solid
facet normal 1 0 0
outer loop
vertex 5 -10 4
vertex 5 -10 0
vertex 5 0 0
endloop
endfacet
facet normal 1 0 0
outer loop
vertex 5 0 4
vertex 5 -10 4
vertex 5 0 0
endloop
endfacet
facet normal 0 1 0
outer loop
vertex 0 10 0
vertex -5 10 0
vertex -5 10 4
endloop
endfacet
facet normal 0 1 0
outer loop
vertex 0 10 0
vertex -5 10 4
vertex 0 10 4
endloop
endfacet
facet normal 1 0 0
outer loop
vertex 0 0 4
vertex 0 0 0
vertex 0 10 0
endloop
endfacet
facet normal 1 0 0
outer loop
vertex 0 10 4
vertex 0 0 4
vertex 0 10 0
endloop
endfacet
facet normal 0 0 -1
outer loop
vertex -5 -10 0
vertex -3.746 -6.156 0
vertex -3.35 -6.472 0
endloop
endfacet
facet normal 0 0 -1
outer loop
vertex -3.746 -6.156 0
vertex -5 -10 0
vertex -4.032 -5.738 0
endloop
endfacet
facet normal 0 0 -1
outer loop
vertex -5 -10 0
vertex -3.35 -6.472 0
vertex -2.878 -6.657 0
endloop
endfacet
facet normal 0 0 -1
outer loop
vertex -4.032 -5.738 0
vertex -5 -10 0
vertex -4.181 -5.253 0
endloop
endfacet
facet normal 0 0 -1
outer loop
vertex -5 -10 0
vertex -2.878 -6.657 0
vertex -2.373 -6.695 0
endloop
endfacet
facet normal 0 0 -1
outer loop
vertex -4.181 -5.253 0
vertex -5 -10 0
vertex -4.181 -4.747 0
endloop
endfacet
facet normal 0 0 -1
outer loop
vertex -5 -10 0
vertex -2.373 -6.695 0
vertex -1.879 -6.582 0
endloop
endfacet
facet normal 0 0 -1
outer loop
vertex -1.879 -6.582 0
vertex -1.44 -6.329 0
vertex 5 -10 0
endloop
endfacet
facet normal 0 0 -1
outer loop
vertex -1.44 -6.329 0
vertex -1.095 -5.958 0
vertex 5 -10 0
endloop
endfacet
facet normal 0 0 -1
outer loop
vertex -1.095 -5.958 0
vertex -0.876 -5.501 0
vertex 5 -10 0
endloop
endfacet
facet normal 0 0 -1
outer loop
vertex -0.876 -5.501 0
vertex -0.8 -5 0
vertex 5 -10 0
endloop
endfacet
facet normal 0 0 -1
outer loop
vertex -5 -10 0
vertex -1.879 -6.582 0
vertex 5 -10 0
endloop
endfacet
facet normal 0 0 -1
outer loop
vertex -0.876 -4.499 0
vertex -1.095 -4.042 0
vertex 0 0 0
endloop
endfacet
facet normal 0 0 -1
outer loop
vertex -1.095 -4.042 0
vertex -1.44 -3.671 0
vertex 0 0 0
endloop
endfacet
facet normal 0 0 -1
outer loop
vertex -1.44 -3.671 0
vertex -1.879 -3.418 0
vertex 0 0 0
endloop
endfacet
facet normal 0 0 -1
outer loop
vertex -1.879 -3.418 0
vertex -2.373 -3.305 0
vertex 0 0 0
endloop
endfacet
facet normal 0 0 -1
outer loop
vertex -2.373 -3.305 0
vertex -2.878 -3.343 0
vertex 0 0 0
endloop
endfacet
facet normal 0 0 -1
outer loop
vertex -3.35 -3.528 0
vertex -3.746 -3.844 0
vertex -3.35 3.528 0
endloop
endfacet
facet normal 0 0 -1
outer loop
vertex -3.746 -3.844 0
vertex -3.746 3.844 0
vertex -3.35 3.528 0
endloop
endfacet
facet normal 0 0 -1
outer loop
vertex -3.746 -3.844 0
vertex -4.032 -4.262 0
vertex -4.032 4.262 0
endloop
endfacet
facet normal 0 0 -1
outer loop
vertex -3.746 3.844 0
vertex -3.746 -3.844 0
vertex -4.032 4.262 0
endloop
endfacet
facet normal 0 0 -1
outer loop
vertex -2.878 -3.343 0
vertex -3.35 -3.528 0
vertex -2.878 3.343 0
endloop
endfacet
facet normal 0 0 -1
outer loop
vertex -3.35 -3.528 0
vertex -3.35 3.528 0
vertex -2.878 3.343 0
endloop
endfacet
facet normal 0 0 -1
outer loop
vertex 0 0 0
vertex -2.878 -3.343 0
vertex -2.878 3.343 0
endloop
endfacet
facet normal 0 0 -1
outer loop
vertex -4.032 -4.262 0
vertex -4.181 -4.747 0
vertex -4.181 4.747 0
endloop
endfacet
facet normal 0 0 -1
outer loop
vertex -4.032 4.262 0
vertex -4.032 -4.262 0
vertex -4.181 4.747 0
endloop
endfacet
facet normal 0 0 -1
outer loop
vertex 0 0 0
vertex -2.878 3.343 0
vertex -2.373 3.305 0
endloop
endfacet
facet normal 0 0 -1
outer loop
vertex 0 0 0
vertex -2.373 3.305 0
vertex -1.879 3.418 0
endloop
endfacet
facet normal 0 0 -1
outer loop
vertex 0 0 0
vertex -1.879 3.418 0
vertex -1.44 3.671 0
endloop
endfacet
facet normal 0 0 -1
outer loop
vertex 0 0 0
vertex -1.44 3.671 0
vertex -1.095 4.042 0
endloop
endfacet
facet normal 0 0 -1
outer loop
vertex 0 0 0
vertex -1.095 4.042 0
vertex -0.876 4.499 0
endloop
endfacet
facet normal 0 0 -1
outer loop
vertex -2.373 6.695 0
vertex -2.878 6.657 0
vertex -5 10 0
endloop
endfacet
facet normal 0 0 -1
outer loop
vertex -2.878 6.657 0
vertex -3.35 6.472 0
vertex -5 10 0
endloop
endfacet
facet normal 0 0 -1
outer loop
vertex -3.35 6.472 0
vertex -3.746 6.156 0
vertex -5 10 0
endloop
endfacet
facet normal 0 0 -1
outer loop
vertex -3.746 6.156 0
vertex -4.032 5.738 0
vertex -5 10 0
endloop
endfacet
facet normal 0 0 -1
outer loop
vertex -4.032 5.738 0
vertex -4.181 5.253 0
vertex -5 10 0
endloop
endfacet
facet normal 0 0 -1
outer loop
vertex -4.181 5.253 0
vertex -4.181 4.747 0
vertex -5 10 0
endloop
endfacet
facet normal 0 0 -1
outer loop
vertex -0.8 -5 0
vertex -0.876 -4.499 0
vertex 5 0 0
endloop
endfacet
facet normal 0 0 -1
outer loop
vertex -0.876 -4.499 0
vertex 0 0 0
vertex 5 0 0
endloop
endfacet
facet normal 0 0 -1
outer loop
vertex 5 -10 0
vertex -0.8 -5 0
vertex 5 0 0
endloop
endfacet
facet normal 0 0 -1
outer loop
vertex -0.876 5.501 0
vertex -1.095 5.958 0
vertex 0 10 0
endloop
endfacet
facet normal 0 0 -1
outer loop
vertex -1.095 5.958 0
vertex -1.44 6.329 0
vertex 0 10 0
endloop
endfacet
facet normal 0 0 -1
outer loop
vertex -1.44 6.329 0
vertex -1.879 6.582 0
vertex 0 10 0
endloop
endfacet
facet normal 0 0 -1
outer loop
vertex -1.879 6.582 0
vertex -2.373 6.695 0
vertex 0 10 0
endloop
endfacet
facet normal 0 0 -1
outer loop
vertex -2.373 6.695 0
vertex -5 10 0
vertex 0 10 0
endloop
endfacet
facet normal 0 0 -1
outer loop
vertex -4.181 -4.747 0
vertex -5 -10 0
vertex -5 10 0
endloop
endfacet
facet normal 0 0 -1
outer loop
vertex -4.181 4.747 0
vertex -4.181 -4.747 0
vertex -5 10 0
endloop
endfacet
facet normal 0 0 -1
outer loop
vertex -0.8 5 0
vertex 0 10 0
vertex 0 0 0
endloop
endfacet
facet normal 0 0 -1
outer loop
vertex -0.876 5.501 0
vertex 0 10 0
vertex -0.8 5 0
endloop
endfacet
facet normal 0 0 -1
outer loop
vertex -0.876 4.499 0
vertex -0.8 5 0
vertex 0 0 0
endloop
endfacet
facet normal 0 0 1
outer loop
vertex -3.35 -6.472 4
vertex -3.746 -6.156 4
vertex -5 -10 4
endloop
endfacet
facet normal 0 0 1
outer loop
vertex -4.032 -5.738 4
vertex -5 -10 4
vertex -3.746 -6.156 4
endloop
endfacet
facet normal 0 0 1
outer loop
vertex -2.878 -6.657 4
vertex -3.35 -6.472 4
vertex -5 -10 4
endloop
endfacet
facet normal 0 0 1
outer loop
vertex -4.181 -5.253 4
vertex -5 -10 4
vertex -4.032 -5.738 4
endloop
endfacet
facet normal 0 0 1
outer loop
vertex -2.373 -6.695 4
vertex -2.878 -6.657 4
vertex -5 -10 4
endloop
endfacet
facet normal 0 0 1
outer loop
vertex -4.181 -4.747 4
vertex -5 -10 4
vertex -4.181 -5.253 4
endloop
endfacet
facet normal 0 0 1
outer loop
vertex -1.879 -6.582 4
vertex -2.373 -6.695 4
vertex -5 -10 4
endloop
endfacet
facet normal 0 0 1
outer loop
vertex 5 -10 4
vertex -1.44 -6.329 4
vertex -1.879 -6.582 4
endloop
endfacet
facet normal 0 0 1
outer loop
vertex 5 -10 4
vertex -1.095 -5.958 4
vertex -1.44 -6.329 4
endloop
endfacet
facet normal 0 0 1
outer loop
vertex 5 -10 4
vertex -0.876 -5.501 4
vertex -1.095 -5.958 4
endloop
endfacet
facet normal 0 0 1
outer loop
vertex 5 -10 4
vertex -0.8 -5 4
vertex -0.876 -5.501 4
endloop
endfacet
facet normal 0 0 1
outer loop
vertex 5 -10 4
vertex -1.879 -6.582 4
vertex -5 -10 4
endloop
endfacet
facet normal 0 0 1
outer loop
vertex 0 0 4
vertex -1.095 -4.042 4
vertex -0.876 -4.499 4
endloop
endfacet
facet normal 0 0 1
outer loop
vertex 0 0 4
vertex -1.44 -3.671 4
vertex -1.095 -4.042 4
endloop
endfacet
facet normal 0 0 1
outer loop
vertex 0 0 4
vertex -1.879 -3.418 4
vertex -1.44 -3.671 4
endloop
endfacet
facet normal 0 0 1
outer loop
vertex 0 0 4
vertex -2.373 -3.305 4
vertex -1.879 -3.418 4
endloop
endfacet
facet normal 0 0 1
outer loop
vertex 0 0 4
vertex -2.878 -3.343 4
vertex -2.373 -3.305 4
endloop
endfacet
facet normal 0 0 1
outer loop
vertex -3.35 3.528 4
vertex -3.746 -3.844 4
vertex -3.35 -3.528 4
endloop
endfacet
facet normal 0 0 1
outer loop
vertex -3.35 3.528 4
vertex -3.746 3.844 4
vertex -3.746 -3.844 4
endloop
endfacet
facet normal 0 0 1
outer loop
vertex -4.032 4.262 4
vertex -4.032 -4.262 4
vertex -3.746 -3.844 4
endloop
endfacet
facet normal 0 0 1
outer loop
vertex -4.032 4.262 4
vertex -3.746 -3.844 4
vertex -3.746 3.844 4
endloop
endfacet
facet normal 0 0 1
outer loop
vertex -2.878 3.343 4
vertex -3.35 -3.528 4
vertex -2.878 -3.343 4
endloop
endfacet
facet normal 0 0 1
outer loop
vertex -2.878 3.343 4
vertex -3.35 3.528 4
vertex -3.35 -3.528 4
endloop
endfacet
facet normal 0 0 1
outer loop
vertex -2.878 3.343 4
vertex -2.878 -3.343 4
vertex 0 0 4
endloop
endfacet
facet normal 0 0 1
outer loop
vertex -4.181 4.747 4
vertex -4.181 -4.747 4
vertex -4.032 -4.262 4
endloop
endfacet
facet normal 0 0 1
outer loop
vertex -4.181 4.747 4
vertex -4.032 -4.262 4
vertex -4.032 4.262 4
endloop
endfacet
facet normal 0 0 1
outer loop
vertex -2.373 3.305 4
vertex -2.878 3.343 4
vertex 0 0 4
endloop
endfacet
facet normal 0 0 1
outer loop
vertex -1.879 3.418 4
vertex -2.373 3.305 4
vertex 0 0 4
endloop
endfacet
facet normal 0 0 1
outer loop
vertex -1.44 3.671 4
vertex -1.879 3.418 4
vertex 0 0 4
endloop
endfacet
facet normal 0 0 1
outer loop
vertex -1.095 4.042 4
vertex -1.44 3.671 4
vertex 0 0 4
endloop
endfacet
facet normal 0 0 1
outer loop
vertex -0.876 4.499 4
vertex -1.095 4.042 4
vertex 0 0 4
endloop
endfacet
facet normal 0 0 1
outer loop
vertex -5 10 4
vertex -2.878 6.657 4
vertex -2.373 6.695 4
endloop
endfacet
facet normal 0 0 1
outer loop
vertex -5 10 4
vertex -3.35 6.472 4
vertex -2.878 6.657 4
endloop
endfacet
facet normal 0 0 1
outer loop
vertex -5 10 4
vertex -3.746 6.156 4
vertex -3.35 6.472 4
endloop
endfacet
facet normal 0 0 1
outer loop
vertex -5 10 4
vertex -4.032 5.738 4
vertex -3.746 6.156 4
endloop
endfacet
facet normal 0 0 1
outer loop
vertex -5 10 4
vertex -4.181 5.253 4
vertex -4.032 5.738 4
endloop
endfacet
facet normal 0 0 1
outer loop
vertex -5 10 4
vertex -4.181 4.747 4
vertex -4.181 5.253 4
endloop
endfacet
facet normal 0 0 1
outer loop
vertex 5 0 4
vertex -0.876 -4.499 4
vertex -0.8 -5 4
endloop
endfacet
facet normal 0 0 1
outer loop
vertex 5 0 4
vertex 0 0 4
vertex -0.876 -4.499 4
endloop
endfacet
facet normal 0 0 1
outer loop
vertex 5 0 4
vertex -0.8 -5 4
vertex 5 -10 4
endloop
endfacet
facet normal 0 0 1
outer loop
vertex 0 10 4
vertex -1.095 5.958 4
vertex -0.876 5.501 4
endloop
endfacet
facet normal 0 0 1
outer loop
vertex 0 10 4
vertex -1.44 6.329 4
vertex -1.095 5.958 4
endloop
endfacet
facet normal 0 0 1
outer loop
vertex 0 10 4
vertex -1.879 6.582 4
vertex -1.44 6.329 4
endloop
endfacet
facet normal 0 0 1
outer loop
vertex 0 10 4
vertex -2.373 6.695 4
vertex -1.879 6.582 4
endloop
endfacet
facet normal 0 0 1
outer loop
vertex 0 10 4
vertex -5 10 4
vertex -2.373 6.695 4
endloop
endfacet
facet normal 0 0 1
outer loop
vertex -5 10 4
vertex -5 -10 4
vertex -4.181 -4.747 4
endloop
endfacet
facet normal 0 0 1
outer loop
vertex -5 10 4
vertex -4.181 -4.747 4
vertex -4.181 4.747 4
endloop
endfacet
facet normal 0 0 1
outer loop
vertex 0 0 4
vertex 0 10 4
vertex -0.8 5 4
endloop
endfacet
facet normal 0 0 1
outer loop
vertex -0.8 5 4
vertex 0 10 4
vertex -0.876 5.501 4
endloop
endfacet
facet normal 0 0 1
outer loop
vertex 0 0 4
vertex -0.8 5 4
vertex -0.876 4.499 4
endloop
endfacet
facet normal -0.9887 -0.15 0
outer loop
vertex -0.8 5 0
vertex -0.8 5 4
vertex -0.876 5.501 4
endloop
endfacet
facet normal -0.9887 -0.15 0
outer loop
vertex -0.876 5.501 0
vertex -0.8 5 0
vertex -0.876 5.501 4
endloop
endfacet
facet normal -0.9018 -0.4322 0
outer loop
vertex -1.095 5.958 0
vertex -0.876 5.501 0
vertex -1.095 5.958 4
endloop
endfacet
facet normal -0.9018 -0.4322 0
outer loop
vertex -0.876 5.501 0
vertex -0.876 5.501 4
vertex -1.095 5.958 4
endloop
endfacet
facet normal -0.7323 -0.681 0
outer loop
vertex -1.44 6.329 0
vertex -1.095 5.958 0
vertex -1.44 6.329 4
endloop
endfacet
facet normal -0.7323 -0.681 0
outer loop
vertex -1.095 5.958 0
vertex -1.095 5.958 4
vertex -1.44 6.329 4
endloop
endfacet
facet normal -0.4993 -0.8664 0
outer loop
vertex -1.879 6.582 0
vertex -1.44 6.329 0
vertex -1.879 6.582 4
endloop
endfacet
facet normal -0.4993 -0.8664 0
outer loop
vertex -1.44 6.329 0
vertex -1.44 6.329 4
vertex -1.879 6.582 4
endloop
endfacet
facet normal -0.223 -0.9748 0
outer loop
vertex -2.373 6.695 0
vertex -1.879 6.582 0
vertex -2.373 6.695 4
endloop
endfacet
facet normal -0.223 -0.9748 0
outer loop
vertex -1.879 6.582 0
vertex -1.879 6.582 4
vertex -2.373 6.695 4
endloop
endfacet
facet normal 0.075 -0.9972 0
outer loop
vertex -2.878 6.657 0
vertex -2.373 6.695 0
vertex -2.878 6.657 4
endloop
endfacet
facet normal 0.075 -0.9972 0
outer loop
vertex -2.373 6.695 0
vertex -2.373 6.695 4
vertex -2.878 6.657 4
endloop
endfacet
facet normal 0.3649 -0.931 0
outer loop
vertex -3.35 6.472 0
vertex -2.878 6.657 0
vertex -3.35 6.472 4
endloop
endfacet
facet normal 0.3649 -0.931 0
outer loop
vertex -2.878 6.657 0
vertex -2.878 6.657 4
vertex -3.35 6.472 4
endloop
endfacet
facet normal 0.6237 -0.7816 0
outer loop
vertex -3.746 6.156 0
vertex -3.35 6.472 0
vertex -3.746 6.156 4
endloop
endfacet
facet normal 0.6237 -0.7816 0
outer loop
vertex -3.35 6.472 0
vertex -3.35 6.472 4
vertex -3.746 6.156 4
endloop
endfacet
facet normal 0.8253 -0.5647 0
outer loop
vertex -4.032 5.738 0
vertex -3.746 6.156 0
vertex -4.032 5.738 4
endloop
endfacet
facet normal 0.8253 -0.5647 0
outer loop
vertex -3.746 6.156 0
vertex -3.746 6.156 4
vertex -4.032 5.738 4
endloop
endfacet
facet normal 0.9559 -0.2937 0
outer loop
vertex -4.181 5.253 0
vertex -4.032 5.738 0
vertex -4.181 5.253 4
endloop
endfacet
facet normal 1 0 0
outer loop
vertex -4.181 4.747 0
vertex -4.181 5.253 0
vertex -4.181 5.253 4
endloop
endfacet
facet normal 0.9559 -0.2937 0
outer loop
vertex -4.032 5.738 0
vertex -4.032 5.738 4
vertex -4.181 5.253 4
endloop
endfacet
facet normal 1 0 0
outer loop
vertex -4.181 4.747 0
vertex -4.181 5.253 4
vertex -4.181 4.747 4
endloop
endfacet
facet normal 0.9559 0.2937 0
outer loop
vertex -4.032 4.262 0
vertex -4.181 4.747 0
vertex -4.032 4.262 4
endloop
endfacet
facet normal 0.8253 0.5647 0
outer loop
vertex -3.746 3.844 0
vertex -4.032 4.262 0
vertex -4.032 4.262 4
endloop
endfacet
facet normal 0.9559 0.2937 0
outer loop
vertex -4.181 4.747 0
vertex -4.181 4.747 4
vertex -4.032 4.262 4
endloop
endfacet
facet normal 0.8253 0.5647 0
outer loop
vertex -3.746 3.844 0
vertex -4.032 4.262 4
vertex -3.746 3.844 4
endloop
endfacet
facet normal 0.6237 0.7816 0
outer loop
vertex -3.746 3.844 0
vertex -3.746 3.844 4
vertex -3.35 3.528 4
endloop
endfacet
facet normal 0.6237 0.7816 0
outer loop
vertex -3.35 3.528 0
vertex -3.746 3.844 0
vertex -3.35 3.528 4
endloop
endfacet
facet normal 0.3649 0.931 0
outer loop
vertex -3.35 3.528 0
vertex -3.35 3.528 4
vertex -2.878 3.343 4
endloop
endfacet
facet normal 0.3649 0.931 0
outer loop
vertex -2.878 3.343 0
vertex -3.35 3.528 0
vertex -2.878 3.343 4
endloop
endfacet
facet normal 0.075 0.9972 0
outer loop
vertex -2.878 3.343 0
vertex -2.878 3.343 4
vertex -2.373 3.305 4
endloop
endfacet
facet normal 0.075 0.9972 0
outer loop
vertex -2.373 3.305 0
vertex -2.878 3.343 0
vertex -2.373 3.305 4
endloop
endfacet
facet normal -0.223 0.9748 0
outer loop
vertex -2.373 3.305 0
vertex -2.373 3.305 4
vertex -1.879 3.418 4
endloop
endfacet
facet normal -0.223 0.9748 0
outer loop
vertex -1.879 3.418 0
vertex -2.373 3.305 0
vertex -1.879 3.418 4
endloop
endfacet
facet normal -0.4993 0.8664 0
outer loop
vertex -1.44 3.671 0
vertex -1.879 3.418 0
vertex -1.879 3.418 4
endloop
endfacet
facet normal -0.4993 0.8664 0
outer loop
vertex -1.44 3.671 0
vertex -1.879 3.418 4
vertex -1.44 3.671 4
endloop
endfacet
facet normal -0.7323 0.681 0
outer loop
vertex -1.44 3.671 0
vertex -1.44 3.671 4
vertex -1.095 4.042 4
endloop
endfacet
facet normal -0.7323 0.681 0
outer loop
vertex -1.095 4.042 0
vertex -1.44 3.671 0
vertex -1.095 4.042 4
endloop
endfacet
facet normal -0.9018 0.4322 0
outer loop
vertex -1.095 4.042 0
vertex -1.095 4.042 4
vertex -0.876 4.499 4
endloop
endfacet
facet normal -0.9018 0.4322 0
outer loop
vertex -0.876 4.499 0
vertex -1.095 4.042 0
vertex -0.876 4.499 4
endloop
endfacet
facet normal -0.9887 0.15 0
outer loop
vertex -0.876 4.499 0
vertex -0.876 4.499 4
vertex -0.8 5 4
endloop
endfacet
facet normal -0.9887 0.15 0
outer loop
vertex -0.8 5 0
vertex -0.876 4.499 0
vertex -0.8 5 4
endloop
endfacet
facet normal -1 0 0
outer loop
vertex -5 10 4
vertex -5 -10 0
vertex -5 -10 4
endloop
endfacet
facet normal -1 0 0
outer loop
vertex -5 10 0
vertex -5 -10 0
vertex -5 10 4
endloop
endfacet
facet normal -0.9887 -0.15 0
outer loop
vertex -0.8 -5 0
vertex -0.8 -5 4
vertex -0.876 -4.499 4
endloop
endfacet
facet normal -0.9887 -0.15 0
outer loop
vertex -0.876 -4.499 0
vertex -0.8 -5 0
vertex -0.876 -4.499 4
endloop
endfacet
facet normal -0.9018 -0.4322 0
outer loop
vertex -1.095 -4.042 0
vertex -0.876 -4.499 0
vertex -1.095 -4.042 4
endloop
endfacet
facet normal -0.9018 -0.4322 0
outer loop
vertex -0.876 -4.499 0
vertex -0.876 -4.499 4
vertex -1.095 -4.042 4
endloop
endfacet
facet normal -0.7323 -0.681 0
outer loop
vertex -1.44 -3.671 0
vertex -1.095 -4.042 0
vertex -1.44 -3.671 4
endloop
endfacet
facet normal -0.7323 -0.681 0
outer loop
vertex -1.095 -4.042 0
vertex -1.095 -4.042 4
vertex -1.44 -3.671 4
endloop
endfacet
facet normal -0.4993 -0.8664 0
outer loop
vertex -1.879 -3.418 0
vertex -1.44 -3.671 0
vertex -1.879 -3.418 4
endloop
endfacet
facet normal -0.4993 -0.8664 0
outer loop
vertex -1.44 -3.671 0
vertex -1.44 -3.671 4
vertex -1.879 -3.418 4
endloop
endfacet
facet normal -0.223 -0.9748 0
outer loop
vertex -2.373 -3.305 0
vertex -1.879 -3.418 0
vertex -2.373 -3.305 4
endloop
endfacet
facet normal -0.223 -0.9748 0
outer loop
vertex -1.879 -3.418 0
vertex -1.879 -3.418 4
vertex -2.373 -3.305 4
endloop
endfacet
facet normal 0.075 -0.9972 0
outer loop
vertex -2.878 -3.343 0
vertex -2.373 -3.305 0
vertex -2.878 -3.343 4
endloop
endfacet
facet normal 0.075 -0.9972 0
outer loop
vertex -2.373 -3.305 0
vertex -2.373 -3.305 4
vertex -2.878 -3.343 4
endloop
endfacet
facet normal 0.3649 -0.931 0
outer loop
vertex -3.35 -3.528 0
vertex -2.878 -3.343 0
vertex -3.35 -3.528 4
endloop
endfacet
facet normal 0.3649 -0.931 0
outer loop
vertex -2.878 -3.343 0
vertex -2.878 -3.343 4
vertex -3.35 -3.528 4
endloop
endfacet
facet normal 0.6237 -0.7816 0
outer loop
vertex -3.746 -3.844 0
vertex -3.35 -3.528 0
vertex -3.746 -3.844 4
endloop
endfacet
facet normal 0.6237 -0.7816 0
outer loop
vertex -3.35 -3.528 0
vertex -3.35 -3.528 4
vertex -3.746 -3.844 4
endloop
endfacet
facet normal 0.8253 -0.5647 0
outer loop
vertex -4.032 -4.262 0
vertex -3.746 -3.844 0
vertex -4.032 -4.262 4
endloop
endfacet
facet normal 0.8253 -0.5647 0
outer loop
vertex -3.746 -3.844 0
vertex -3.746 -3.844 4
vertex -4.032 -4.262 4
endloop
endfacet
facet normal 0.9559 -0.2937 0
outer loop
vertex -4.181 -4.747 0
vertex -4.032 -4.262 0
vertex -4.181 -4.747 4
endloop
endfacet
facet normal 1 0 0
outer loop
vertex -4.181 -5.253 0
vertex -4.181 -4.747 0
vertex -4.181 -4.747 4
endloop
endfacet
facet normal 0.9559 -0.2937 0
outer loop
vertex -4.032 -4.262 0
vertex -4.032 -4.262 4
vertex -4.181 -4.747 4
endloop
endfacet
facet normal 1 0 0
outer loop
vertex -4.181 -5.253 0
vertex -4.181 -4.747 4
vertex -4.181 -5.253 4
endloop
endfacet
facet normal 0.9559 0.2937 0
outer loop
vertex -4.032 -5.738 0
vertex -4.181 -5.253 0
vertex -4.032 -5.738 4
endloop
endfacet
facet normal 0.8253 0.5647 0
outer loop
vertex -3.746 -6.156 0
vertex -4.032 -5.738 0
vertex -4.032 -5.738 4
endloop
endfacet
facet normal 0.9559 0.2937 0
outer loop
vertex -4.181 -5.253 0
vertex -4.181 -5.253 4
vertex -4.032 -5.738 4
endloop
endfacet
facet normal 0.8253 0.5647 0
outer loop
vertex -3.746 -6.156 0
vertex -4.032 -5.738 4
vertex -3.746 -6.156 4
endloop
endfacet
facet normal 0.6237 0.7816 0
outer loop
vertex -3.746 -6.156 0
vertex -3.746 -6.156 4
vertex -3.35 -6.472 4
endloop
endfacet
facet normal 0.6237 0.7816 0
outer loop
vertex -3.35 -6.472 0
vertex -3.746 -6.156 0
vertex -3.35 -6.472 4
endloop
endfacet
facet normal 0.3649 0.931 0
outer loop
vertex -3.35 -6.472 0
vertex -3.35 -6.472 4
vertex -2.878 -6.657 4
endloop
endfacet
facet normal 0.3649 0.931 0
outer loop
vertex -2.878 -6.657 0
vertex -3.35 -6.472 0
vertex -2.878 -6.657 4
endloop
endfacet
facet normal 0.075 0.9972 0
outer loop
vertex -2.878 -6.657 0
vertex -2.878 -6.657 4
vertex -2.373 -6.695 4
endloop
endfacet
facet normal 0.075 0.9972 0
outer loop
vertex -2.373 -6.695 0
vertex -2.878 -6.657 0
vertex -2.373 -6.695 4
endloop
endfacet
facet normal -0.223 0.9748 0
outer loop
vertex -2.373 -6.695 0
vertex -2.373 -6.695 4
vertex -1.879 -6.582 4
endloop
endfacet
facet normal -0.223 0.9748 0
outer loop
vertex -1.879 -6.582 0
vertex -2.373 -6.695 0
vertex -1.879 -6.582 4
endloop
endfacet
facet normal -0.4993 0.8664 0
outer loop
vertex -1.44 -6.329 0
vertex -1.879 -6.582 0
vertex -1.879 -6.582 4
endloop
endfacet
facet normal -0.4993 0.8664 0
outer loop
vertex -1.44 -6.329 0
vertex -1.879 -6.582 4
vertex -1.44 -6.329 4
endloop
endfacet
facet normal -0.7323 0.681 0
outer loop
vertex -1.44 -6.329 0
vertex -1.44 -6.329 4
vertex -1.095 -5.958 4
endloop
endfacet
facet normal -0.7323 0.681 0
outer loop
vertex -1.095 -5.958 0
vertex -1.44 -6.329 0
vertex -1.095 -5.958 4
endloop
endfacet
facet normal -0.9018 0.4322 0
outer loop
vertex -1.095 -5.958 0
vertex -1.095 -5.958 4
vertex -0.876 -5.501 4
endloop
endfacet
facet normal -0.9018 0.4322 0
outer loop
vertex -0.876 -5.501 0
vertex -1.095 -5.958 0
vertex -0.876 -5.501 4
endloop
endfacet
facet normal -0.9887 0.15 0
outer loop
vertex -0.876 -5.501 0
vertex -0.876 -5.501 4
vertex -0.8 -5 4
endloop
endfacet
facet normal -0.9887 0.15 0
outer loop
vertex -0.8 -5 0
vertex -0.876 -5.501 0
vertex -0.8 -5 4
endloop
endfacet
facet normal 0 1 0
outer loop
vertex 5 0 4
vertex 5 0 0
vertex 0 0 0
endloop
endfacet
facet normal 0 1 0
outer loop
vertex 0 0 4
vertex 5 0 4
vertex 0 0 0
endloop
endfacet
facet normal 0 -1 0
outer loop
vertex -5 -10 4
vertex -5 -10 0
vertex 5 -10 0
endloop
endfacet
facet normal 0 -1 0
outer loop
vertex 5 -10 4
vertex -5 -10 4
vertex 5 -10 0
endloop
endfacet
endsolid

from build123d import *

# Parameters (mm, degrees)
ESQUISSE1_W             = 10
ESQUISSE1_H             = 20
BOSS_EXTRU_1_DEPTH      = 4
D_GAGEMENT_M33_D        = 3.4
ESQUISSE2_W             = 5
ESQUISSE2_H             = 10
ENL_V_MAT_EXTRU_2_DEPTH = 4


with BuildPart() as part:
    # Esquisse1 → Boss.-Extru.1 (new body)
    with BuildSketch(Plane.XY):
        Rectangle(ESQUISSE1_W, ESQUISSE1_H)
    extrude(amount=BOSS_EXTRU_1_DEPTH)

    # Dégagement M33 (through all)
    with Locations(Plane(origin=(0, 0, 0), x_dir=(-1, 0, 0), z_dir=(0, 0, -1))):
        with Locations((2.5, 5), (2.5, -5)):
            Hole(D_GAGEMENT_M33_D / 2)

    # Esquisse2 → Enlèv. mat.-Extru.2 (cut)
    with BuildSketch(Plane(origin=(0, 0, 0), x_dir=(-1, 0, 0), z_dir=(0, 0, -1))):
        with Locations((-2.5, 5)):
            Rectangle(ESQUISSE2_W, ESQUISSE2_H)
    extrude(amount=-ENL_V_MAT_EXTRU_2_DEPTH, mode=Mode.SUBTRACT)


solid = part.part
